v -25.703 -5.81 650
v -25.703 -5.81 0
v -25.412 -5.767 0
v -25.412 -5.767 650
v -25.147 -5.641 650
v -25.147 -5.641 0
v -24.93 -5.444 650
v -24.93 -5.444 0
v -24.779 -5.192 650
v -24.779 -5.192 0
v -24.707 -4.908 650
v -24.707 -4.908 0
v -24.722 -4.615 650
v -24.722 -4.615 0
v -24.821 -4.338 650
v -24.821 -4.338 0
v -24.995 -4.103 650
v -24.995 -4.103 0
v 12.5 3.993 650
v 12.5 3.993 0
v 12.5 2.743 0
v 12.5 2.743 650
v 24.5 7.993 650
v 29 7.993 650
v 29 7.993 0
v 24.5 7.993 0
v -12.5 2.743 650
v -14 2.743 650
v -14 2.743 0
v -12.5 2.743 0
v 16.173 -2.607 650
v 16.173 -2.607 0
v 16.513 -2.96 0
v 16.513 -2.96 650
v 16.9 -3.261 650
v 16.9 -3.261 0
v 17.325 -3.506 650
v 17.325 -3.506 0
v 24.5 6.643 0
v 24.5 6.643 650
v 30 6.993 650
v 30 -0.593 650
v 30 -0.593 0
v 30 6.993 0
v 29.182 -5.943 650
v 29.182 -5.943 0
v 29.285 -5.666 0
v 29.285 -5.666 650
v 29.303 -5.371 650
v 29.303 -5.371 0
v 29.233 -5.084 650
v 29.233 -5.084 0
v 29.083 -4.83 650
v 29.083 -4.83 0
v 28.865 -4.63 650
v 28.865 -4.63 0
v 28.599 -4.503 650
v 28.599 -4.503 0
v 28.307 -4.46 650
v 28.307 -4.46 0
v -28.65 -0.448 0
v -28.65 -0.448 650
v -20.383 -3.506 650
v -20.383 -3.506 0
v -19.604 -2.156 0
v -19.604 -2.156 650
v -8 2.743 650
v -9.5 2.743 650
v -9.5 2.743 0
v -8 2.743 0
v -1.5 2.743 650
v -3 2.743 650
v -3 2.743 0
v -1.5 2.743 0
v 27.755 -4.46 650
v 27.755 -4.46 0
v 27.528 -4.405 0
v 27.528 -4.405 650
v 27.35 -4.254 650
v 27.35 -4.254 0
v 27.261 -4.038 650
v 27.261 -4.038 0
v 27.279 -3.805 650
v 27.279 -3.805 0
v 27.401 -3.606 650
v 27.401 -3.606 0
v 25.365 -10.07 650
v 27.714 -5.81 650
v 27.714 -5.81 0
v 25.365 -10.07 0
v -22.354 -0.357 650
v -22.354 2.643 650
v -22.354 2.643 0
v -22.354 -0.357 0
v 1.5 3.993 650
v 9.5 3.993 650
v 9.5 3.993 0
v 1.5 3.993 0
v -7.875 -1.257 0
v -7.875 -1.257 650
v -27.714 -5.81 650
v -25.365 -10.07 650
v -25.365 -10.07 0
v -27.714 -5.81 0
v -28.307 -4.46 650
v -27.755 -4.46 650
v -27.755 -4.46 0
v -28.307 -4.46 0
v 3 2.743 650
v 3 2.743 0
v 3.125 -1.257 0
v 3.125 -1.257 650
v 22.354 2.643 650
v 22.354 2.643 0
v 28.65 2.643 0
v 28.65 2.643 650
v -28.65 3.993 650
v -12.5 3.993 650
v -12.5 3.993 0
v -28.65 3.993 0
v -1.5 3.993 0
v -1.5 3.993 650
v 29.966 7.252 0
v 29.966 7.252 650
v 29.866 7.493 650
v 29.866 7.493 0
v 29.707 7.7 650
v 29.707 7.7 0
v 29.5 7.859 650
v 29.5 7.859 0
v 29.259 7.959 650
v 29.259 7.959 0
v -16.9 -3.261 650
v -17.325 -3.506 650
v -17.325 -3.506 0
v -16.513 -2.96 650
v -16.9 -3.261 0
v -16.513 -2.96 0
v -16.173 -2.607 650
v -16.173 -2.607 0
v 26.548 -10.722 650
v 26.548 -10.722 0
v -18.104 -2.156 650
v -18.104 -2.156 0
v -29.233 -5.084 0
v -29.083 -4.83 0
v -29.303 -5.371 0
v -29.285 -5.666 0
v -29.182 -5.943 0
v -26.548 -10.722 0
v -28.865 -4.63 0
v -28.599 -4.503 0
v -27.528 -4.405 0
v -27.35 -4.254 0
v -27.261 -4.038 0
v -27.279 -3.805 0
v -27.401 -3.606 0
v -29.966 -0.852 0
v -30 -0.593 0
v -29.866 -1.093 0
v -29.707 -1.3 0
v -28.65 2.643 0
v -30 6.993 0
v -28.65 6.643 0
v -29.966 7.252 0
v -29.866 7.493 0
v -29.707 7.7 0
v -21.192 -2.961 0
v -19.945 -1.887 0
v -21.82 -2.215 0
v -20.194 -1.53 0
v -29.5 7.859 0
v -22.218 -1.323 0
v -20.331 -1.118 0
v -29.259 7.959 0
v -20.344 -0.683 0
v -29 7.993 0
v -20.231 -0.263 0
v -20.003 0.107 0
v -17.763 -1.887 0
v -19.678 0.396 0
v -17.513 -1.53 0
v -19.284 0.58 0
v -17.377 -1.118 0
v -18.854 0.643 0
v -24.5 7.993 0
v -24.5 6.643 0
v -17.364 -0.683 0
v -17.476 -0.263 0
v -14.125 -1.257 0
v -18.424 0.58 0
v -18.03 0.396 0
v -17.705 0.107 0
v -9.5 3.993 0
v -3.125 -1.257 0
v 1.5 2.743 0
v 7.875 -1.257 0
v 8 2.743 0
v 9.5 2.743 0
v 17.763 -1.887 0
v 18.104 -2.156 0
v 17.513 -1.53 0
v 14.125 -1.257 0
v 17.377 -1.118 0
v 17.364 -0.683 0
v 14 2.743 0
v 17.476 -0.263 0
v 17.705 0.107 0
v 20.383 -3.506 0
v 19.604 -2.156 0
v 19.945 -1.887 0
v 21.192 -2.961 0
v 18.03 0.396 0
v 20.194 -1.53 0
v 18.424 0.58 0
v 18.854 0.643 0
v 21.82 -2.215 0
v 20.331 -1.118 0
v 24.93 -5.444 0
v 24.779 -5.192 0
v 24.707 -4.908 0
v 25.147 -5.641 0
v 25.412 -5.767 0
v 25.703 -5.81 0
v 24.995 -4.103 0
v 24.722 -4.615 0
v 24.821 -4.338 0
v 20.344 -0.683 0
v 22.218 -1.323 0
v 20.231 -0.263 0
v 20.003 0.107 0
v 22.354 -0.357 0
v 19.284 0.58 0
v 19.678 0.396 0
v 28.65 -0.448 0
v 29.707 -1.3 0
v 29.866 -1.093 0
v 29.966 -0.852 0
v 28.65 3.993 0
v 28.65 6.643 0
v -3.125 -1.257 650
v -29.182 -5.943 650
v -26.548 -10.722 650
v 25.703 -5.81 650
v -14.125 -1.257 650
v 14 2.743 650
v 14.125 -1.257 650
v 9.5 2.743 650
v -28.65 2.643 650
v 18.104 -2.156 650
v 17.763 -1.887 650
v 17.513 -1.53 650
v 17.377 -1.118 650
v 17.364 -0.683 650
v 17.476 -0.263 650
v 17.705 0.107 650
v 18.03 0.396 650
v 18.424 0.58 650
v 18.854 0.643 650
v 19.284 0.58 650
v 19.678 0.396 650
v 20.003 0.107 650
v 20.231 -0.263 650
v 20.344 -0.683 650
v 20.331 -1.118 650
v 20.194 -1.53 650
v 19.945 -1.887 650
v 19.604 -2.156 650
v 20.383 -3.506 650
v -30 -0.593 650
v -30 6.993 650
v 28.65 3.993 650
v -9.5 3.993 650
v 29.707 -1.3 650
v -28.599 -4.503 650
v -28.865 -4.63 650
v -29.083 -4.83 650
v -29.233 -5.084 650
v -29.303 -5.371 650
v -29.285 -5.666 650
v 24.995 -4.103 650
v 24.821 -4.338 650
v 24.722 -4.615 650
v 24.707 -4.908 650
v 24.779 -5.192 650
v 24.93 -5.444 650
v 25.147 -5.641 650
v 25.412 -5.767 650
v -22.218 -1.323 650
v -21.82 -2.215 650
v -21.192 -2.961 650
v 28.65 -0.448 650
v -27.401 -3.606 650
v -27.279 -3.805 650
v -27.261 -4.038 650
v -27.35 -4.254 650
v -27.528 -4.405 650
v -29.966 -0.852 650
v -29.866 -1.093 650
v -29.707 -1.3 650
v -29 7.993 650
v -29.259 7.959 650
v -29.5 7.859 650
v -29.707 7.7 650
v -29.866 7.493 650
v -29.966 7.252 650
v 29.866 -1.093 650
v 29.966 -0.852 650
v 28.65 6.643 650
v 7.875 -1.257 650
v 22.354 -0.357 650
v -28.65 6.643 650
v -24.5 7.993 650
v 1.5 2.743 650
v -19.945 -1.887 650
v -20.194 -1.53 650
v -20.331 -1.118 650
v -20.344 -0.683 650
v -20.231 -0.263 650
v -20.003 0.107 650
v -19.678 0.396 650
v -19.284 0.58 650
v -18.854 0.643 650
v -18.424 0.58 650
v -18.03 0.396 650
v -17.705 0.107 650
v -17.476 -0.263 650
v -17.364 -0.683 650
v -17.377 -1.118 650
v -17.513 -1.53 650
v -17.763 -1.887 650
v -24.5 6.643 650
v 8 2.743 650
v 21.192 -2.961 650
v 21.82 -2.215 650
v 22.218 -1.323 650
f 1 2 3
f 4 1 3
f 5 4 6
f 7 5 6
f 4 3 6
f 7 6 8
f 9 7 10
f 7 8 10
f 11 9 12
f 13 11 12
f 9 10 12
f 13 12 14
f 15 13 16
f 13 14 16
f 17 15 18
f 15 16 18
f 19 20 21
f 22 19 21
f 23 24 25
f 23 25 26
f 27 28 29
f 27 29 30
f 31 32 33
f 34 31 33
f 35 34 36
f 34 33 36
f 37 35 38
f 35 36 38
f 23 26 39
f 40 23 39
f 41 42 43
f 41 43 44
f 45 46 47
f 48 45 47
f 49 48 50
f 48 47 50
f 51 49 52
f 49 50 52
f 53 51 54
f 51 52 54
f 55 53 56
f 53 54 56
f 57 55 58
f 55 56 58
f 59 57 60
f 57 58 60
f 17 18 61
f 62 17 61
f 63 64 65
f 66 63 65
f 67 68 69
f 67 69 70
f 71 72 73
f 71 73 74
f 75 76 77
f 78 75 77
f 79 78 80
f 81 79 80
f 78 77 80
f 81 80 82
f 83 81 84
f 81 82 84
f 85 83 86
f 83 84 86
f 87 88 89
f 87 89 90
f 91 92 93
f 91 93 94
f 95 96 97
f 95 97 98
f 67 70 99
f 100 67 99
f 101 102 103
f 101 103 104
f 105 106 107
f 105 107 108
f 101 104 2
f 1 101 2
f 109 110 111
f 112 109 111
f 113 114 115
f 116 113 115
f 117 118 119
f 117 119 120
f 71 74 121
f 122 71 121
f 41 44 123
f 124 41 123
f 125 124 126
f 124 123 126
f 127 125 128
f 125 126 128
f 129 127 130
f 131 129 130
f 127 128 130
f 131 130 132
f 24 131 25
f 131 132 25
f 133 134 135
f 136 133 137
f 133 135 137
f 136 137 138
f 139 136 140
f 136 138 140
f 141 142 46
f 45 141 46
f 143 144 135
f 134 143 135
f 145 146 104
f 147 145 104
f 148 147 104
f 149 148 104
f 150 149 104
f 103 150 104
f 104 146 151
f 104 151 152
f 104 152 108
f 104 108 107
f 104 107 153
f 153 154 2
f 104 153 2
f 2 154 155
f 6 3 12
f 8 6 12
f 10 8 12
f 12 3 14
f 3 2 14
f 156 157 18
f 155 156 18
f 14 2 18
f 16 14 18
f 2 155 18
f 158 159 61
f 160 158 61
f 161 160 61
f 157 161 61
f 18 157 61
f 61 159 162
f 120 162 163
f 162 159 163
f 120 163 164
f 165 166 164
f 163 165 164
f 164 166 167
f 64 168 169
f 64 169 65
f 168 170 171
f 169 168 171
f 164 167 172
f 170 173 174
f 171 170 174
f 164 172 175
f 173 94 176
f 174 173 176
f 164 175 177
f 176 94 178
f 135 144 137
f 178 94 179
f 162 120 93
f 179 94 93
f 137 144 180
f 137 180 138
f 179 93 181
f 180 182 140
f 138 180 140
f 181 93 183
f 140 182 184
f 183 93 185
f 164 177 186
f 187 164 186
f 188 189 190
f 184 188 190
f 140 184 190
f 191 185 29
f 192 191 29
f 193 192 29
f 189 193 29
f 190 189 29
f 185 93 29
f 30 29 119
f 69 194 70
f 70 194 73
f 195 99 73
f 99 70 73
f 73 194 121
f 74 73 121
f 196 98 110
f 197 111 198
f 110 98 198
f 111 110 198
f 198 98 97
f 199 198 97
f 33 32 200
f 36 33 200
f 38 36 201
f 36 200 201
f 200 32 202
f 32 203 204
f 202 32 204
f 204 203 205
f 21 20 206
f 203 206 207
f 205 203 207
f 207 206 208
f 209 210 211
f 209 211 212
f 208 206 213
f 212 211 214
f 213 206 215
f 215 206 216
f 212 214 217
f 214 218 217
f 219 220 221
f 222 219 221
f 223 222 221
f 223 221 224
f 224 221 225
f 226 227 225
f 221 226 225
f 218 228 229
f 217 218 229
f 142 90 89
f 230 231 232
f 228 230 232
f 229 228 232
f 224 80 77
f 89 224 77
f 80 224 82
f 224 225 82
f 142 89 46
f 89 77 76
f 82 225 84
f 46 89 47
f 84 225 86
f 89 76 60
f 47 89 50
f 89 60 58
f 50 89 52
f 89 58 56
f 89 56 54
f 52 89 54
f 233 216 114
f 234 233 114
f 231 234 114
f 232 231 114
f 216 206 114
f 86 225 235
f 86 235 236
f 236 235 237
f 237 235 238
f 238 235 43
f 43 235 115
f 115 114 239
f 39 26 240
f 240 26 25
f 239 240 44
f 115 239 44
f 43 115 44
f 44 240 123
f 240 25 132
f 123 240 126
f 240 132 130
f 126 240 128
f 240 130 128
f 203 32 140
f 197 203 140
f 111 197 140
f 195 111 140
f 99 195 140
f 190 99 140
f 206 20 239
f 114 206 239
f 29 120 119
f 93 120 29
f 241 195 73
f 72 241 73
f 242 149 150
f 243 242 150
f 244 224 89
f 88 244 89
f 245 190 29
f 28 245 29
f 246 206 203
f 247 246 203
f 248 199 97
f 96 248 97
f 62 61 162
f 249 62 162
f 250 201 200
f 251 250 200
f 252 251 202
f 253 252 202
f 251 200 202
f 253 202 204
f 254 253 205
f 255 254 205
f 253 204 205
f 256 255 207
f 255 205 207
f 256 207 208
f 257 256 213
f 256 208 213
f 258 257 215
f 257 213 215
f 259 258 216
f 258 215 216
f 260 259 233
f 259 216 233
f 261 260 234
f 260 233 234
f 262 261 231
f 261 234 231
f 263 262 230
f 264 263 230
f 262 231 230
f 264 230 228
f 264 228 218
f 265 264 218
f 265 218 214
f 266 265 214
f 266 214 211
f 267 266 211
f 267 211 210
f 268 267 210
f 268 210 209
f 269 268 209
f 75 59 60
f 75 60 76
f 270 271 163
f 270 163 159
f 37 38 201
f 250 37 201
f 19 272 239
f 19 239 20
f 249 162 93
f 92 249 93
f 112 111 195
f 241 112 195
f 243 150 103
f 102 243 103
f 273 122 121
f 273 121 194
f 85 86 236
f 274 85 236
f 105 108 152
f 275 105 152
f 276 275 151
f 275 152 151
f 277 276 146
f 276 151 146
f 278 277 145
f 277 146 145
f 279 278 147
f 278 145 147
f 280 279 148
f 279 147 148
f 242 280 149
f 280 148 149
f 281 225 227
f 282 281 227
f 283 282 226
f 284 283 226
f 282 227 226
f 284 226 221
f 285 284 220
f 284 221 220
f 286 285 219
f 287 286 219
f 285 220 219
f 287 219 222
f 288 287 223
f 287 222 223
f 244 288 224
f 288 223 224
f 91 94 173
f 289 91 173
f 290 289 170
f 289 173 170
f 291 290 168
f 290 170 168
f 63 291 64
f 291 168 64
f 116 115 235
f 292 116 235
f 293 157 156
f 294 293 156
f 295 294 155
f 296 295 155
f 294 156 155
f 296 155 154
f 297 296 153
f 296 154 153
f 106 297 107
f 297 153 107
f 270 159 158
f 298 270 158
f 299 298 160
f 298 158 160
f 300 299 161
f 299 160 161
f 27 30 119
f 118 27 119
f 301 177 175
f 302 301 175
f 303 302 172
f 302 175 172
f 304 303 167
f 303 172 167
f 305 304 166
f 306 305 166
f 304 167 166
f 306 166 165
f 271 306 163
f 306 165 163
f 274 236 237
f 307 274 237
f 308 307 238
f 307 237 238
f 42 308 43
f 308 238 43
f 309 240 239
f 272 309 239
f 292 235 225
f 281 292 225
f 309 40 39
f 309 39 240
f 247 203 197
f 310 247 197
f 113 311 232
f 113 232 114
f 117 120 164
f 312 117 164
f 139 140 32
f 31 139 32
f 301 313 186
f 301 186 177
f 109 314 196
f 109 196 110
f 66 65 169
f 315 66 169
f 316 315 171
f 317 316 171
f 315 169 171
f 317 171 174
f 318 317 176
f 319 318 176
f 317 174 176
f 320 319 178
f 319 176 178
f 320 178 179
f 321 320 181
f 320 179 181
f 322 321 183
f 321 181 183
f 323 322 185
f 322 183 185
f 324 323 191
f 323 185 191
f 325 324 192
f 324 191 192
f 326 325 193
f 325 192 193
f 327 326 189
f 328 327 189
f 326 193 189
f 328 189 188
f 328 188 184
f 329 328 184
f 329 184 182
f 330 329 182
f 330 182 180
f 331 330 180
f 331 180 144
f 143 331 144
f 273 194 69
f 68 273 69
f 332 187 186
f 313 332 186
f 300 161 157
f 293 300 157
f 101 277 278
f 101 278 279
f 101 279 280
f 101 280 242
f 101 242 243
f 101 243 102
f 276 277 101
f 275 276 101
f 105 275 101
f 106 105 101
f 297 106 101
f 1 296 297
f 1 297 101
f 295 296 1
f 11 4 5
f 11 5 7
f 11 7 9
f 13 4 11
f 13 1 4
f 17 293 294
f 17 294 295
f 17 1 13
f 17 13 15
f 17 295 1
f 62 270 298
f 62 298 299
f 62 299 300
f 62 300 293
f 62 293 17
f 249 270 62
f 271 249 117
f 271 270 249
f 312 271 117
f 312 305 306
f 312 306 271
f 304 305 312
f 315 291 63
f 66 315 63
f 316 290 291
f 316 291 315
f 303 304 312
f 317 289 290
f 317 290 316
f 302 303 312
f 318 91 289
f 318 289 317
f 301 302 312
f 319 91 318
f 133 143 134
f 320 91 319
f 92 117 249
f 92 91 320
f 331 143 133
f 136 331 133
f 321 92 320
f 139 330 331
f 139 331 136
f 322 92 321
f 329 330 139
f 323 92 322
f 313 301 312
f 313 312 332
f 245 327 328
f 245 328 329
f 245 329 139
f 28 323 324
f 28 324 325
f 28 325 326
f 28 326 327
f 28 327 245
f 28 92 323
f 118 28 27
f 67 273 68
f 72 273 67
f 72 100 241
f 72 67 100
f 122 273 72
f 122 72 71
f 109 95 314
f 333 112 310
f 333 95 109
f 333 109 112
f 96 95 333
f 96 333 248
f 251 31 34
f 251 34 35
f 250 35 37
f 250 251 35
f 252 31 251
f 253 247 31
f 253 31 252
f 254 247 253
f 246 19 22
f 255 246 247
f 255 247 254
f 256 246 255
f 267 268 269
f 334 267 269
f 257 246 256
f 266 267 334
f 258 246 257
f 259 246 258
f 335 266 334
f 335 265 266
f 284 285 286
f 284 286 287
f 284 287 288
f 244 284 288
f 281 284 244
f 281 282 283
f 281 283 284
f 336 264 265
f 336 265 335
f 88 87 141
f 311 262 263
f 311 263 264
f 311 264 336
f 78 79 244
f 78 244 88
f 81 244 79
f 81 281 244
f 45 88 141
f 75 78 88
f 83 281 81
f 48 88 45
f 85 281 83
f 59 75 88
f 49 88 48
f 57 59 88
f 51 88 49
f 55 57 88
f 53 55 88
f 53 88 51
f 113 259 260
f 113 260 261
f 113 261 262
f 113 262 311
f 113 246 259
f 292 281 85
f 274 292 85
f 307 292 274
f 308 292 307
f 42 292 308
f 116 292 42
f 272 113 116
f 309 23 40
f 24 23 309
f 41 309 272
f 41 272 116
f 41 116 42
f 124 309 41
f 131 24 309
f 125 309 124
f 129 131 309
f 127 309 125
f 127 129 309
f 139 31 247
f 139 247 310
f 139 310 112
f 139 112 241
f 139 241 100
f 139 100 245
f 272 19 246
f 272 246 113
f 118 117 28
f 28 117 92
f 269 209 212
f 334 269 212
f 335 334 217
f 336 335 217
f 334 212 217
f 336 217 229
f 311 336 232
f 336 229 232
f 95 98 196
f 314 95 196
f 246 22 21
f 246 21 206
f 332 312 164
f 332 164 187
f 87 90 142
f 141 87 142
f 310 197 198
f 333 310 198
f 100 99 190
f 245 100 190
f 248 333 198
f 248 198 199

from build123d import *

# Parameters (mm, degrees)
F1_DEPTH = 650


with BuildPart() as f1:
    # F0 (on Top) → F1 (new body)
    with BuildSketch(Plane.XY):
        with BuildLine():
            Line((-16.172833, -2.607296), (16.172833, -2.607296))
            ThreePointArc((16.172833, -2.607296), (16.701406, -3.117236), (17.32476, -3.505642))
            Line((17.32476, -3.505642), (18.103784, -2.156334))
            ThreePointArc((18.103784, -2.156334), (18.853784, 0.642704), (19.603784, -2.156334))
            Line((19.603784, -2.156334), (20.382808, -3.505642))
            ThreePointArc((20.382808, -3.505642), (21.820397, -2.2145), (22.353784, -0.357296))
            Line((22.353784, -0.357296), (22.353784, 2.642704))
            Line((22.353784, 2.642704), (28.65, 2.642704))
            Line((28.65, 2.642704), (28.65, -0.448107))
            Line((28.65, -0.448107), (24.995488, -4.102619))
            ThreePointArc((24.995488, -4.102619), (24.778715, -5.192409), (25.702595, -5.809726))
            Line((25.702595, -5.809726), (27.714112, -5.809726))
            Line((27.714112, -5.809726), (25.365345, -10.069868))
            Line((25.365345, -10.069868), (26.54757, -10.72167))
            Line((26.54757, -10.72167), (29.182471, -5.942542))
            ThreePointArc((29.182471, -5.942542), (29.1678, -4.951207), (28.30675, -4.459726))
            Line((28.30675, -4.459726), (27.754677, -4.459726))
            ThreePointArc((27.754677, -4.459726), (27.292737, -4.151068), (27.401123, -3.606173))
            Line((27.401123, -3.606173), (29.707107, -1.300189))
            ThreePointArc((29.707107, -1.300189), (29.92388, -0.975766), (30, -0.593082))
            Line((30, -0.593082), (30, 6.992704))
            ThreePointArc((30, 6.992704), (29.707107, 7.699811), (29, 7.992704))
            Line((29, 7.992704), (24.5, 7.992704))
            Line((24.5, 7.992704), (24.5, 6.642704))
            Line((24.5, 6.642704), (28.65, 6.642704))
            Line((28.65, 6.642704), (28.65, 3.992704))
            Line((28.65, 3.992704), (12.5, 3.992704))
            Line((12.5, 3.992704), (12.5, 2.742704))
            Line((12.5, 2.742704), (14, 2.742704))
            Line((14, 2.742704), (14.125, -1.257296))
            Line((14.125, -1.257296), (7.875, -1.257296))
            Line((7.875, -1.257296), (8, 2.742704))
            Line((8, 2.742704), (9.5, 2.742704))
            Line((9.5, 2.742704), (9.5, 3.992704))
            Line((9.5, 3.992704), (1.5, 3.992704))
            Line((1.5, 3.992704), (1.5, 2.742704))
            Line((1.5, 2.742704), (3, 2.742704))
            Line((3, 2.742704), (3.125, -1.257296))
            Line((3.125, -1.257296), (-3.125, -1.257296))
            Line((-3.125, -1.257296), (-3, 2.742704))
            Line((-3, 2.742704), (-1.5, 2.742704))
            Line((-1.5, 2.742704), (-1.5, 3.992704))
            Line((-1.5, 3.992704), (-9.5, 3.992704))
            Line((-9.5, 3.992704), (-9.5, 2.742704))
            Line((-9.5, 2.742704), (-8, 2.742704))
            Line((-8, 2.742704), (-7.875, -1.257296))
            Line((-7.875, -1.257296), (-14.125, -1.257296))
            Line((-14.125, -1.257296), (-14, 2.742704))
            Line((-14, 2.742704), (-12.5, 2.742704))
            Line((-12.5, 2.742704), (-12.5, 3.992704))
            Line((-12.5, 3.992704), (-28.65, 3.992704))
            Line((-28.65, 3.992704), (-28.65, 6.642704))
            Line((-28.65, 6.642704), (-24.5, 6.642704))
            Line((-24.5, 6.642704), (-24.5, 7.992704))
            Line((-24.5, 7.992704), (-29, 7.992704))
            ThreePointArc((-29, 7.992704), (-29.707107, 7.699811), (-30, 6.992704))
            Line((-30, 6.992704), (-30, -0.593082))
            ThreePointArc((-30, -0.593082), (-29.92388, -0.975766), (-29.707107, -1.300189))
            Line((-29.707107, -1.300189), (-27.401123, -3.606173))
            ThreePointArc((-27.401123, -3.606173), (-27.292737, -4.151068), (-27.754677, -4.459726))
            Line((-27.754677, -4.459726), (-28.30675, -4.459726))
            ThreePointArc((-28.30675, -4.459726), (-29.1678, -4.951207), (-29.182471, -5.942542))
            Line((-29.182471, -5.942542), (-26.54757, -10.72167))
            Line((-26.54757, -10.72167), (-25.365345, -10.069868))
            Line((-25.365345, -10.069868), (-27.714112, -5.809726))
            Line((-27.714112, -5.809726), (-25.702595, -5.809726))
            ThreePointArc((-25.702595, -5.809726), (-24.778715, -5.192409), (-24.995488, -4.102619))
            Line((-24.995488, -4.102619), (-28.65, -0.448107))
            Line((-28.65, -0.448107), (-28.65, 2.642704))
            Line((-28.65, 2.642704), (-22.353784, 2.642704))
            Line((-22.353784, 2.642704), (-22.353784, -0.357296))
            ThreePointArc((-22.353784, -0.357296), (-21.820397, -2.2145), (-20.382808, -3.505642))
            Line((-20.382808, -3.505642), (-19.603784, -2.156334))
            ThreePointArc((-19.603784, -2.156334), (-18.853784, 0.642704), (-18.103784, -2.156334))
            Line((-18.103784, -2.156334), (-17.32476, -3.505642))
            ThreePointArc((-17.32476, -3.505642), (-16.701406, -3.117236), (-16.172833, -2.607296))
        make_face()
    extrude(amount=F1_DEPTH)


solid = f1.part
